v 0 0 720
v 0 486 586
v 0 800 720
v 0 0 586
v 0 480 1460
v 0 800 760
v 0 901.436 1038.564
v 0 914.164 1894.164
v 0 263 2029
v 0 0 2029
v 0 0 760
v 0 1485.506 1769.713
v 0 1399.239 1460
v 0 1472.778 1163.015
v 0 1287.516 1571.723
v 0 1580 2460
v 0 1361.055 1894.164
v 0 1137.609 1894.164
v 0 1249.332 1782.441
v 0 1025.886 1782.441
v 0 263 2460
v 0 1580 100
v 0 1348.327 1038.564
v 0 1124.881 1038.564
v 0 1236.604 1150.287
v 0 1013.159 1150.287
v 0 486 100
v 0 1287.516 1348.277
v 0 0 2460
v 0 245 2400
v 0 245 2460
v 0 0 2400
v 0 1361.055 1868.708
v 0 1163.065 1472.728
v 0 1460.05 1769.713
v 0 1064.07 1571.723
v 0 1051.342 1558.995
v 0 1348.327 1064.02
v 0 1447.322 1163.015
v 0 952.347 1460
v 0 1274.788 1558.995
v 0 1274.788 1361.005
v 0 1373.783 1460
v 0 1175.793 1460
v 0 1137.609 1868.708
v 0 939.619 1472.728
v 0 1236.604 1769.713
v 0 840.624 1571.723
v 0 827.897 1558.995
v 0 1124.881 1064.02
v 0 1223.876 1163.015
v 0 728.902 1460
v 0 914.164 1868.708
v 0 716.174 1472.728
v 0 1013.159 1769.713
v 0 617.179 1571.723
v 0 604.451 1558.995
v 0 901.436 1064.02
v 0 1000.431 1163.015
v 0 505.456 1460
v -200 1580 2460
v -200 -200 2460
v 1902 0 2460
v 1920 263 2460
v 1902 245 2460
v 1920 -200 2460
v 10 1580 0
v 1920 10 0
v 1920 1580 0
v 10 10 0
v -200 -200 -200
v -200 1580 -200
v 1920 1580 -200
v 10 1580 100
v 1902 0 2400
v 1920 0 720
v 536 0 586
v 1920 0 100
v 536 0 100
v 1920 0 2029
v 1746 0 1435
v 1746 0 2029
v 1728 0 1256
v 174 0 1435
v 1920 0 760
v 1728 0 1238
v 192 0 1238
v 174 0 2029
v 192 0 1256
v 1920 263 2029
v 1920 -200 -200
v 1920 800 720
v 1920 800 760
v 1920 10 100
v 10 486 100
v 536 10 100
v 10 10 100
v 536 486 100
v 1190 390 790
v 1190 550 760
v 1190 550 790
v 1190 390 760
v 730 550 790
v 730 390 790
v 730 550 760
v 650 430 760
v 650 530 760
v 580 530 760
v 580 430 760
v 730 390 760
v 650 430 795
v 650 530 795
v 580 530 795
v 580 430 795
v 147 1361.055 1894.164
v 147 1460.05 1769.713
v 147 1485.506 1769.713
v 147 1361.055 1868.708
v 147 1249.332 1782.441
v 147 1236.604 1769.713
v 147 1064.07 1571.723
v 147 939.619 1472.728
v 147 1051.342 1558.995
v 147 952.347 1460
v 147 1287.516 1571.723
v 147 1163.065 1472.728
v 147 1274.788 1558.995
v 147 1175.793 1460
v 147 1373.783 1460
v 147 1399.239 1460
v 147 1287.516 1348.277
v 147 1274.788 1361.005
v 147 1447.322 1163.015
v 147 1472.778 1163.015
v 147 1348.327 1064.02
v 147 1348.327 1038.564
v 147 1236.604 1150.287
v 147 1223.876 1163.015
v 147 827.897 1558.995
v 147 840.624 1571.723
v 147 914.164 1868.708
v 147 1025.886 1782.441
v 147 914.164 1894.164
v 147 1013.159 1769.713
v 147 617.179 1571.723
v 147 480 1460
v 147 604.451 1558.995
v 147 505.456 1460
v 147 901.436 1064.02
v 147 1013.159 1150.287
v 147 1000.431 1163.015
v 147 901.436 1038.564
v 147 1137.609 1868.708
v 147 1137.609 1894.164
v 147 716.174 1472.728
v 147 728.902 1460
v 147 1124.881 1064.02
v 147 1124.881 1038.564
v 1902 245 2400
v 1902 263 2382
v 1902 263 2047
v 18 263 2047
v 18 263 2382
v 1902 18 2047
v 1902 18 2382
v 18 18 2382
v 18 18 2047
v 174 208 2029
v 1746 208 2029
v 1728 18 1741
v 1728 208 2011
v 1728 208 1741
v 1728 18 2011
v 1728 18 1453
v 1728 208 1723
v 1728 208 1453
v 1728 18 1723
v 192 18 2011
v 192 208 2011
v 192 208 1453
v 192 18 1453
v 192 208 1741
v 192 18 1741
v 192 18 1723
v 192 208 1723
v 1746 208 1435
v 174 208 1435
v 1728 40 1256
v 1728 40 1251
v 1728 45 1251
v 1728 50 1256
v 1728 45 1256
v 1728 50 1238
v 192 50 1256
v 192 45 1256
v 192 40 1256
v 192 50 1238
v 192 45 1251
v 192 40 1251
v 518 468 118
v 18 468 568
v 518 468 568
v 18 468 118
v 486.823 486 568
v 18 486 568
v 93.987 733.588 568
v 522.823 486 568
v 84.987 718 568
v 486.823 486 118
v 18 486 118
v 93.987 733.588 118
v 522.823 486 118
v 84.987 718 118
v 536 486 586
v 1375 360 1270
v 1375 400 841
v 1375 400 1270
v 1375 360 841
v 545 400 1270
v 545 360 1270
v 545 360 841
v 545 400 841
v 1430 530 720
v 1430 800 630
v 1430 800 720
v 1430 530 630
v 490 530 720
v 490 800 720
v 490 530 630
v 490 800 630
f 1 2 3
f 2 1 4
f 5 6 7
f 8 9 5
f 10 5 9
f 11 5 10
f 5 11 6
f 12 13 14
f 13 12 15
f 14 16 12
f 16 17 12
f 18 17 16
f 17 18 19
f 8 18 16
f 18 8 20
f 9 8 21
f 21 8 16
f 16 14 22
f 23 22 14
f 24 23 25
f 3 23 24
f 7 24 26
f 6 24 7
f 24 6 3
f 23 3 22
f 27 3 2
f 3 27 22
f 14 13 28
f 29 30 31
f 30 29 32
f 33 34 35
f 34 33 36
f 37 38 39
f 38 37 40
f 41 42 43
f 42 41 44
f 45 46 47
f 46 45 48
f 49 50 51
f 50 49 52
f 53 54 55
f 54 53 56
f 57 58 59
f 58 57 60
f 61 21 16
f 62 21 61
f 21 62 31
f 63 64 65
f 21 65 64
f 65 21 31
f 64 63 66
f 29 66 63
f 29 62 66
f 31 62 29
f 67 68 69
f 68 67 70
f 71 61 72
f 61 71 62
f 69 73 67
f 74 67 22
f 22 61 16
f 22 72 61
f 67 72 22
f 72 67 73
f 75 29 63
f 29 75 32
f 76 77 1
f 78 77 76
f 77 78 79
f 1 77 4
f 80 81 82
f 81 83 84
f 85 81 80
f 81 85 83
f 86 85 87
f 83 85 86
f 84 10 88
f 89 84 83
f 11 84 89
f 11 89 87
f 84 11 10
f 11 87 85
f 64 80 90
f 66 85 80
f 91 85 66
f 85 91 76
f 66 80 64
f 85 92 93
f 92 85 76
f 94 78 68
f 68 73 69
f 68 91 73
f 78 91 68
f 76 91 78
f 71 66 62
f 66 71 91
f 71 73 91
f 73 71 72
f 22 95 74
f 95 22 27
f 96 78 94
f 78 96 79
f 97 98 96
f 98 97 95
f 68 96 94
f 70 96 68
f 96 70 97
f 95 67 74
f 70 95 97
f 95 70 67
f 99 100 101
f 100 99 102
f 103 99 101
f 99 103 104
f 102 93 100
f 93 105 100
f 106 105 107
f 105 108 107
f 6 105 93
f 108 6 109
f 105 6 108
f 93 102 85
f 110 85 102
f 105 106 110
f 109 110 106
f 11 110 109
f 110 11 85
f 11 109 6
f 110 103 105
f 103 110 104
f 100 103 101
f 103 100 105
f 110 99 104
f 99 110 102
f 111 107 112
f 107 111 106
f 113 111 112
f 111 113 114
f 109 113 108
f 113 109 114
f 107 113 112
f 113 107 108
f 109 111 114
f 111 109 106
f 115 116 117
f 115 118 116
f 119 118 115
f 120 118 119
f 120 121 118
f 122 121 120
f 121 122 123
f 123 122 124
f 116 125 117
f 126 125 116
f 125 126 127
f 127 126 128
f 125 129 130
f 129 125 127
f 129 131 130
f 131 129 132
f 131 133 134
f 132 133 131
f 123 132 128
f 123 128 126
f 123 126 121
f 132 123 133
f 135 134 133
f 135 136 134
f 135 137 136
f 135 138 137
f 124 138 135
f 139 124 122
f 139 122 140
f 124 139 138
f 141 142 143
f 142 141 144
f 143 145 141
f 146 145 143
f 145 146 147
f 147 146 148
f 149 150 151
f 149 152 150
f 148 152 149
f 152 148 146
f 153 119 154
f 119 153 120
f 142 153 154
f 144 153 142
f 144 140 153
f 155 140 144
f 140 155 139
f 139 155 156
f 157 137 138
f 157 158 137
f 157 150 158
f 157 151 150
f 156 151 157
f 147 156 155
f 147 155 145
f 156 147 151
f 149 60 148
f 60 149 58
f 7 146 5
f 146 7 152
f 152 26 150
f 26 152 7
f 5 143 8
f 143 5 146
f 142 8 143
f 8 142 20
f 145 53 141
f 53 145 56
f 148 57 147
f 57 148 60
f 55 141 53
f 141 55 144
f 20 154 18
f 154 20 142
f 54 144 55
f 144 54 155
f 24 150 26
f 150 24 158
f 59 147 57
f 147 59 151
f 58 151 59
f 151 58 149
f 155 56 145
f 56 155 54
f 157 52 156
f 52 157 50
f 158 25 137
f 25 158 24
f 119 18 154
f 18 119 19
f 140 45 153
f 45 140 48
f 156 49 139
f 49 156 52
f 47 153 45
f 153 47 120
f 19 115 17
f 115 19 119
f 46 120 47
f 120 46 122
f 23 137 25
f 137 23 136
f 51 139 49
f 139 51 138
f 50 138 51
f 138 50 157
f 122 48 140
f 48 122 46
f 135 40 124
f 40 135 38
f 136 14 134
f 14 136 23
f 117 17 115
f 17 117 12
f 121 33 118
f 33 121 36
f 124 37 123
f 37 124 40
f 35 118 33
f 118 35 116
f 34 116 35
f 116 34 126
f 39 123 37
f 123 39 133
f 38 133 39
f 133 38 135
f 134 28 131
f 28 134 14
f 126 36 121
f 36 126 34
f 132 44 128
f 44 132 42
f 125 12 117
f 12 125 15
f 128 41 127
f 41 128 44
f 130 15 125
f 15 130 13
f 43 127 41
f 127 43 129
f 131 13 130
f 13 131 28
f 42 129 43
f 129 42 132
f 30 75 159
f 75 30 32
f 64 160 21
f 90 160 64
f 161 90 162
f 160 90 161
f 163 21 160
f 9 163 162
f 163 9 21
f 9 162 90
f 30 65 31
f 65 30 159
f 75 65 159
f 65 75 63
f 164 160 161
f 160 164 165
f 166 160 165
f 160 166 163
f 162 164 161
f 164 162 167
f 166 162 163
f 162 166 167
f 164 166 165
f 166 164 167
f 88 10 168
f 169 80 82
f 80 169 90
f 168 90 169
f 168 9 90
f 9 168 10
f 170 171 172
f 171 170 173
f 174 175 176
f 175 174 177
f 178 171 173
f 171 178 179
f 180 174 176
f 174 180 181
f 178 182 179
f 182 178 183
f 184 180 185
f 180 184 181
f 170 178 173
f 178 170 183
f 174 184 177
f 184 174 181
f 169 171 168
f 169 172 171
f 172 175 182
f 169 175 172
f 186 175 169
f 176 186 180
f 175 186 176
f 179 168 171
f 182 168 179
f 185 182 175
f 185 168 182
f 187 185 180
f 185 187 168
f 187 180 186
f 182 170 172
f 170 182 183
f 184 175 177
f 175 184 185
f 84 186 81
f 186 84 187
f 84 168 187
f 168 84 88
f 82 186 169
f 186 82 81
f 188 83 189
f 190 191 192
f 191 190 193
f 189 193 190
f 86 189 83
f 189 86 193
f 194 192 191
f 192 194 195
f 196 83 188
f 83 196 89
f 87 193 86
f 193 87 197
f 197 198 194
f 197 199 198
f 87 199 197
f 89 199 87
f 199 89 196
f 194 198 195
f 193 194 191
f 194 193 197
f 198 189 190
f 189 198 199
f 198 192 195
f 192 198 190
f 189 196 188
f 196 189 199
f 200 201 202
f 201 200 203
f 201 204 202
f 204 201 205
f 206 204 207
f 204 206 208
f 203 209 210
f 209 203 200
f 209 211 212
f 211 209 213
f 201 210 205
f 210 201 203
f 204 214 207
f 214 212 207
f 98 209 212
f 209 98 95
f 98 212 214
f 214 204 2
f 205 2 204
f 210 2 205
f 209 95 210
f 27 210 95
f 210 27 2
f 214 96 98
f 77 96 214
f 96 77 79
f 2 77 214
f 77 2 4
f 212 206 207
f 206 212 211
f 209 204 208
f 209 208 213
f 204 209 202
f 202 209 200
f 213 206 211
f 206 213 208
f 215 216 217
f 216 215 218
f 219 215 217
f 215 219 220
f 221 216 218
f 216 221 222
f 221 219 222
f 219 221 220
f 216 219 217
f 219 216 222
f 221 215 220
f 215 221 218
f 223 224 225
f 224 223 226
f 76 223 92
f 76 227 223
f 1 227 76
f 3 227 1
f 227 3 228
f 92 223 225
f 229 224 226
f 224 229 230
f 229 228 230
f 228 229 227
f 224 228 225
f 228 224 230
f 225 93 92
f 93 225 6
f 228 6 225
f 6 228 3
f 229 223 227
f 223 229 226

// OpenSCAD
//kamer
kamer = [1920,1580,2460];
muur_dikte = 200;
plint_h = 100;
plint_d = 10;

// allerlei
mdf_dikte = 18;
ooghoogte = 1270;
armafstand = 400;

// toetsenbord + muis
toetsenbord = [460,160,30];
muis = [70,100,35];

// schermen
scherm_p = [830,40,429];

// synthesizer
synth = [367,1024,119];
synth_marge_kabels = 130;
synth_h = 650;

// midi controller
midi = [940,270,90];

// werkblad
werkblad = [1920,800,40];
werkhoogte = 760;

//3D printer
3D_printer = [450,500,450];

//schabben hoog
plint_plafond_hoogte = 60;
stripboek_hoogte = 315;
stripboek_hoogte_marge = 20;
stripboek_diepte = 225;
stripboek_diepte_marge = 20;
boek_hoogte = 250;
boek_diepte = 170;
boek_hoogte_marge = 20;
boek_diepte_marge = 20;
klein_boek_hoogte = 180;
klein_boek_hoogte_marge = 0;
cd_hoogte = 125;
cd_diepte = 142;
cd_marge_h = 15;
cd_marge_d = 5;

smaller_factor = 0.8;
foto_plank_diepte = 50;




// de kamer zelf
color([.2,.2,.2,.5]) {
    translate([-muur_dikte,0,0]){
        cube([muur_dikte,kamer.y,kamer.z]);
    }
    translate([-muur_dikte,-muur_dikte,0]){
        cube([kamer.x+muur_dikte,muur_dikte,kamer.z]);
    }
    translate([-muur_dikte,-muur_dikte,-muur_dikte]){
        cube([kamer.x+muur_dikte,kamer.y+muur_dikte,muur_dikte]);
    }
    translate([-0,-0,-0]){
        cube([kamer.x,plint_d,plint_h]);
    }
    translate([-0,-0,-0]){
        cube([plint_d,kamer.y,plint_h]);
    }
}

// primair scherm
{
    translate([werkblad.x/2 - scherm_p.x/2, werkblad.y - scherm_p.y - armafstand, ooghoogte -scherm_p.z]){
        # cube(scherm_p);
    }
}

// synth
/*
{ 
    translate([synth_marge_kabels,kamer.y - synth.y, synth_h]){
        # cube(synth);
    }
}
*/

// toetsenbord + muis
{
    translate([0,0,werkhoogte]){
       translate([  werkblad.x/2-toetsenbord.x/2,
                    werkblad.y-toetsenbord.y-250,
                    0]){
            # cube(toetsenbord);
            translate([-150,40,0]){
                # cube(muis);
            }
        }
    }
}

// midi
{
    translate([ werkblad.x/2-midi.x/2,werkblad.y-midi.y,werkhoogte-werkblad.z-midi.z]){
        # cube(midi);
    }
}

//werkblad
{
    translate([0,0,werkhoogte-werkblad.z]){
        cube([werkblad.x, werkblad.y, werkblad.z]);
    }
}


// cd rek
translate([0,kamer.y - 1100,kamer.z-1000]) {
    rotate([-45,0,0]){
        teken_cd_rek();
    }
}

//wandkasten -> stripboeken
translate([0,0,kamer.z]){
    teken_wand_kast();
}

//wandkast -> boekenrek
translate([0,0,kamer.z - (plint_plafond_hoogte + 2*mdf_dikte + stripboek_hoogte + stripboek_hoogte_marge) - mdf_dikte]){
    teken_boekenkast();
}

//fotoplankje
translate([0,0,werkhoogte+550]){
    teken_foto_plank();
}

// printer kast
translate([3D_printer.y+2*mdf_dikte,0,plint_h]){
    rotate([0,0,90]){
        teken_printer_kast();
    }
}


module teken_cd_rek() {
    n_hoeken = 3; // aantal hoekvormige modules in het rek
    cdvak = [cd_diepte + cd_marge_d,cd_hoogte + cd_marge_h,cd_hoogte + cd_marge_h];
    
    // kast bestaat uit hoekvormige modules en een afsluitend hoekje
    for(i=[0:n_hoeken-1]){
        teken_hoek_module(i);
    }
    //afsluitend hoekje
    teken_afsluitend_hoekje(n_hoeken);
    
    /*
    * lijn trekken om de maximale breedte te zien
    */
    //teken_max_breedte(1000);
    
    /*
    * cd blokken tekenen om te zien of alles past
    */
    //teken_cds();
    
    /*
    * helperfunties en -modules
    */
    module teken_hoek_module(n) {
        l4 = 4*cdvak.y + 2*mdf_dikte;   // lengte plank van 4 eenheden
        l5 = 5*cdvak.y + 2*mdf_dikte;   // lengte plank van 5 eenheden
        l1 = cdvak.y;                   // inliggend plankje van 1 eenheid
        
        translate([0,n*(mdf_dikte+cdvak.y),n*(mdf_dikte+cdvak.z)]) {
            {
                if (n==0) {
                    cube([cdvak.x,l4,mdf_dikte]);
                } else {
                    translate([0,-cdvak.y,0]) {
                        cube([cdvak.x,l5,mdf_dikte]);
                    }
                }
            }
            
            translate([0,0,mdf_dikte]) {
                cube([cdvak.x,mdf_dikte,l4]);
            }
            
            translate([0,mdf_dikte,l4]) {
                cube([cdvak.x,l1,mdf_dikte]);
            }
            
            translate([0,l4-mdf_dikte,mdf_dikte]) {
                cube([cdvak.x,mdf_dikte,l1]);
            }
        }
        
    }
    
    module teken_afsluitend_hoekje(n_hoeken) {

        translate([ 0,
                    (n_hoeken-1) * cdvak.y + n_hoeken * mdf_dikte,
                    n_hoeken * mdf_dikte + n_hoeken * cdvak.z]) 
        {
            l = 4*cdvak.y + mdf_dikte;
            cube([cdvak.x,l,mdf_dikte]);
        }
        
        translate([ 0,
                    n_hoeken * cdvak.y + n_hoeken * mdf_dikte,
                    (n_hoeken+1) * mdf_dikte + n_hoeken * cdvak.z]) 
        {
            l = 3*cdvak.y + mdf_dikte;
            cube([cdvak.x,mdf_dikte,l]);
        }
        
        translate([ 0,
                    n_hoeken * cdvak.y + (n_hoeken+1) * mdf_dikte,
                    (n_hoeken+1) * (mdf_dikte + cdvak.z)]) 
        {
            l = cdvak.y + mdf_dikte;
            cube([cdvak.x,l,mdf_dikte]);
        }
        
        translate([ 0,
                    (n_hoeken+1) * (cdvak.y + mdf_dikte),
                    (n_hoeken+1) * mdf_dikte + n_hoeken * cdvak.z]) 
        {
            l = cdvak.y;
            cube([cdvak.x,mdf_dikte,l]);
        }

    }
    
    
    module teken_max_breedte(max_l) {
        rotate([45,0,0]){
            translate([-5,0,0]){
                color([0,1,1,1]) cube([10,max_l,10]);
            }
        }
    }
    
    module teken_cds() {
        n_rijen = 3; // aantal "vakken" dat het cd rek heeft
        cd_kleur = [.91,.48,.81,.6];
        
        function offset_y(kolom) = mdf_dikte + kolom * (cdvak.y+mdf_dikte);
        function offset_z(rij) = mdf_dikte + rij * (cdvak.z+mdf_dikte);

        // rijen opvullen
        for(j=[0:n_rijen - 1]) {
            for(i=[0:n_rijen]) {
                translate([ 0,
                            offset_y(j) + i*cdvak.y,
                            offset_z(j) ])
                {
                    color(cd_kleur) cube(cdvak);
                }
            }
        }
        
        // kolommen opvullen
        for(j=[0:n_rijen-1]) {
            translate([0,0,offset_z(j)]) {
                for(i=[1:n_rijen]){
                    translate([0,offset_y(j),mdf_dikte+i*cdvak.z]) {
                        color(cd_kleur) cube(cdvak);
                    }
                }
            }
        }
        
        // laatste vakje opvullen
        translate([
            0,
            mdf_dikte + n_rijen * (mdf_dikte + cdvak.y),
            mdf_dikte + n_rijen * (mdf_dikte + cdvak.z)]) 
        { 
                    color(cd_kleur) cube(cdvak); 
        }
    }
}

module teken_wand_kast() {
    //teken_boeken();
    //van boven naar beneden: plint - strips - boeken - boeken - boeken
    teken_plint();
    teken_strip_module(1);
    
    
    module teken_plint(){
        x = 0;
        y = stripboek_diepte + stripboek_diepte_marge - mdf_dikte;
        z = -plint_plafond_hoogte;
        
        //voorkant
        translate([x,y+mdf_dikte,z]){
            cube([kamer.x, mdf_dikte,plint_plafond_hoogte]);
        }
        
        //zijkant
        translate([kamer.x-mdf_dikte,0,z]){
            cube([mdf_dikte, y+mdf_dikte,plint_plafond_hoogte]);
        }
    }
    
    module teken_strip_module(vakken) {
        h = stripboek_hoogte + stripboek_hoogte_marge;
        b = kamer.x;
        d = stripboek_diepte + stripboek_diepte_marge;
        
        //achterwand
        translate([mdf_dikte,0,-plint_plafond_hoogte-h-mdf_dikte]){
            cube([b-2*mdf_dikte,mdf_dikte,h]);
        }
        
        //onderste plank
        translate([0,0,-plint_plafond_hoogte-h-2*mdf_dikte]){
            cube([b,d+mdf_dikte,mdf_dikte]);
        }
        
        //bovenste plank
        translate([0,0,-plint_plafond_hoogte-mdf_dikte]){
            cube([b,d+mdf_dikte,mdf_dikte]);
        }
        
        //zijkanten
        translate([0,0,-plint_plafond_hoogte-h-mdf_dikte]){
            cube([mdf_dikte,d+mdf_dikte,h]);
        }
        translate([kamer.x-mdf_dikte,0,-plint_plafond_hoogte-h-mdf_dikte]){
            cube([mdf_dikte,d+mdf_dikte,h]);
        }
    }
    
    module teken_boeken(){
        h = stripboek_hoogte + stripboek_hoogte_marge;
        b = kamer.x;
        d = stripboek_diepte + stripboek_diepte_marge;
        translate([0,mdf_dikte,-plint_plafond_hoogte-h-mdf_dikte]){
            #cube([b,d,h]);
        }
    }
}

module teken_boekenkast(){
    h = boek_hoogte + boek_hoogte_marge;
    b = kamer.x * smaller_factor;
    d = boek_diepte + boek_diepte_marge;
    
    x = kamer.x/2-b/2;
    
    //eerste rij boeken
    translate([x,mdf_dikte,-h]){
        //#cube([b,d,h]);
    }
    //tweede rij boeken
    translate([x,mdf_dikte,-(2*h + mdf_dikte)]){
        //#cube([b,d,h]);
    }
    
    //achterwand
    translate([x,0,-(2*h+mdf_dikte)]){
        cube([b,mdf_dikte,2*h+mdf_dikte]);
    }
    
    //bovenste plank
    translate([x,0,0]){
        cube([b,d+mdf_dikte,mdf_dikte]);
    }
    
    //middelste plank
    translate([x,mdf_dikte,-(h+mdf_dikte)]){
        cube([b,d,mdf_dikte]);
    }
    
    //onderste plank
    translate([x,0,-2*(h+mdf_dikte)]){
        cube([b,d+mdf_dikte,mdf_dikte]);
    }
    
    //linkerkant
    translate([x-mdf_dikte,0,-2*(h+mdf_dikte)]){
        cube([mdf_dikte,d+mdf_dikte,3*mdf_dikte + 2*h]);
    }
    
    //rechterkant
    translate([x+b,0,-2*(h+mdf_dikte)]){
        cube([mdf_dikte,d+mdf_dikte,3*mdf_dikte + 2*h]);
    }
}

module teken_foto_plank(){    
    h = mdf_dikte;
    b = kamer.x * smaller_factor;
    d = foto_plank_diepte;
    
    x = kamer.x/2-b/2;
    difference(){
        //plankje
        translate([x,0,-2*(h+mdf_dikte)]){
            cube([b,d,h]);
        }
        
        //goot frezen
        translate([x,foto_plank_diepte - 10 ,-2*(h+mdf_dikte)+(mdf_dikte - 5)]){
            cube([b,5,5]);
        }
    }
}

module teken_printer_kast(){
    // 3D printer
    translate([mdf_dikte,mdf_dikte,mdf_dikte]){
            color("blue",.5) cube(3D_printer);
    }
    //onder
    translate([0,0,0]){
        cube([3D_printer.x + 2*mdf_dikte,3D_printer.y + 2*mdf_dikte, mdf_dikte]);
    }
    //boven
    translate([0,0,3D_printer.z+mdf_dikte]){
        cube([3D_printer.x + 2*mdf_dikte,3D_printer.y + 2*mdf_dikte, mdf_dikte]);
    }
    //links (deur)
    translate([3D_printer.x+mdf_dikte,mdf_dikte,mdf_dikte]){
        rotate(a=-30, v=[0,0,1]){
            cube([mdf_dikte,3D_printer.y, 3D_printer.z]);
        }
    }
    //rechts
    translate([0,mdf_dikte,mdf_dikte]){
        cube([mdf_dikte,3D_printer.y, 3D_printer.z]);
    }
    //achter
    translate([0,0,mdf_dikte]){
        cube([3D_printer.x + 2*mdf_dikte,mdf_dikte, 3D_printer.z]);
    }
    //voor
    translate([0,3D_printer.y+mdf_dikte,mdf_dikte]){
        cube([3D_printer.x + 2*mdf_dikte,mdf_dikte, 3D_printer.z]);
    }
}
